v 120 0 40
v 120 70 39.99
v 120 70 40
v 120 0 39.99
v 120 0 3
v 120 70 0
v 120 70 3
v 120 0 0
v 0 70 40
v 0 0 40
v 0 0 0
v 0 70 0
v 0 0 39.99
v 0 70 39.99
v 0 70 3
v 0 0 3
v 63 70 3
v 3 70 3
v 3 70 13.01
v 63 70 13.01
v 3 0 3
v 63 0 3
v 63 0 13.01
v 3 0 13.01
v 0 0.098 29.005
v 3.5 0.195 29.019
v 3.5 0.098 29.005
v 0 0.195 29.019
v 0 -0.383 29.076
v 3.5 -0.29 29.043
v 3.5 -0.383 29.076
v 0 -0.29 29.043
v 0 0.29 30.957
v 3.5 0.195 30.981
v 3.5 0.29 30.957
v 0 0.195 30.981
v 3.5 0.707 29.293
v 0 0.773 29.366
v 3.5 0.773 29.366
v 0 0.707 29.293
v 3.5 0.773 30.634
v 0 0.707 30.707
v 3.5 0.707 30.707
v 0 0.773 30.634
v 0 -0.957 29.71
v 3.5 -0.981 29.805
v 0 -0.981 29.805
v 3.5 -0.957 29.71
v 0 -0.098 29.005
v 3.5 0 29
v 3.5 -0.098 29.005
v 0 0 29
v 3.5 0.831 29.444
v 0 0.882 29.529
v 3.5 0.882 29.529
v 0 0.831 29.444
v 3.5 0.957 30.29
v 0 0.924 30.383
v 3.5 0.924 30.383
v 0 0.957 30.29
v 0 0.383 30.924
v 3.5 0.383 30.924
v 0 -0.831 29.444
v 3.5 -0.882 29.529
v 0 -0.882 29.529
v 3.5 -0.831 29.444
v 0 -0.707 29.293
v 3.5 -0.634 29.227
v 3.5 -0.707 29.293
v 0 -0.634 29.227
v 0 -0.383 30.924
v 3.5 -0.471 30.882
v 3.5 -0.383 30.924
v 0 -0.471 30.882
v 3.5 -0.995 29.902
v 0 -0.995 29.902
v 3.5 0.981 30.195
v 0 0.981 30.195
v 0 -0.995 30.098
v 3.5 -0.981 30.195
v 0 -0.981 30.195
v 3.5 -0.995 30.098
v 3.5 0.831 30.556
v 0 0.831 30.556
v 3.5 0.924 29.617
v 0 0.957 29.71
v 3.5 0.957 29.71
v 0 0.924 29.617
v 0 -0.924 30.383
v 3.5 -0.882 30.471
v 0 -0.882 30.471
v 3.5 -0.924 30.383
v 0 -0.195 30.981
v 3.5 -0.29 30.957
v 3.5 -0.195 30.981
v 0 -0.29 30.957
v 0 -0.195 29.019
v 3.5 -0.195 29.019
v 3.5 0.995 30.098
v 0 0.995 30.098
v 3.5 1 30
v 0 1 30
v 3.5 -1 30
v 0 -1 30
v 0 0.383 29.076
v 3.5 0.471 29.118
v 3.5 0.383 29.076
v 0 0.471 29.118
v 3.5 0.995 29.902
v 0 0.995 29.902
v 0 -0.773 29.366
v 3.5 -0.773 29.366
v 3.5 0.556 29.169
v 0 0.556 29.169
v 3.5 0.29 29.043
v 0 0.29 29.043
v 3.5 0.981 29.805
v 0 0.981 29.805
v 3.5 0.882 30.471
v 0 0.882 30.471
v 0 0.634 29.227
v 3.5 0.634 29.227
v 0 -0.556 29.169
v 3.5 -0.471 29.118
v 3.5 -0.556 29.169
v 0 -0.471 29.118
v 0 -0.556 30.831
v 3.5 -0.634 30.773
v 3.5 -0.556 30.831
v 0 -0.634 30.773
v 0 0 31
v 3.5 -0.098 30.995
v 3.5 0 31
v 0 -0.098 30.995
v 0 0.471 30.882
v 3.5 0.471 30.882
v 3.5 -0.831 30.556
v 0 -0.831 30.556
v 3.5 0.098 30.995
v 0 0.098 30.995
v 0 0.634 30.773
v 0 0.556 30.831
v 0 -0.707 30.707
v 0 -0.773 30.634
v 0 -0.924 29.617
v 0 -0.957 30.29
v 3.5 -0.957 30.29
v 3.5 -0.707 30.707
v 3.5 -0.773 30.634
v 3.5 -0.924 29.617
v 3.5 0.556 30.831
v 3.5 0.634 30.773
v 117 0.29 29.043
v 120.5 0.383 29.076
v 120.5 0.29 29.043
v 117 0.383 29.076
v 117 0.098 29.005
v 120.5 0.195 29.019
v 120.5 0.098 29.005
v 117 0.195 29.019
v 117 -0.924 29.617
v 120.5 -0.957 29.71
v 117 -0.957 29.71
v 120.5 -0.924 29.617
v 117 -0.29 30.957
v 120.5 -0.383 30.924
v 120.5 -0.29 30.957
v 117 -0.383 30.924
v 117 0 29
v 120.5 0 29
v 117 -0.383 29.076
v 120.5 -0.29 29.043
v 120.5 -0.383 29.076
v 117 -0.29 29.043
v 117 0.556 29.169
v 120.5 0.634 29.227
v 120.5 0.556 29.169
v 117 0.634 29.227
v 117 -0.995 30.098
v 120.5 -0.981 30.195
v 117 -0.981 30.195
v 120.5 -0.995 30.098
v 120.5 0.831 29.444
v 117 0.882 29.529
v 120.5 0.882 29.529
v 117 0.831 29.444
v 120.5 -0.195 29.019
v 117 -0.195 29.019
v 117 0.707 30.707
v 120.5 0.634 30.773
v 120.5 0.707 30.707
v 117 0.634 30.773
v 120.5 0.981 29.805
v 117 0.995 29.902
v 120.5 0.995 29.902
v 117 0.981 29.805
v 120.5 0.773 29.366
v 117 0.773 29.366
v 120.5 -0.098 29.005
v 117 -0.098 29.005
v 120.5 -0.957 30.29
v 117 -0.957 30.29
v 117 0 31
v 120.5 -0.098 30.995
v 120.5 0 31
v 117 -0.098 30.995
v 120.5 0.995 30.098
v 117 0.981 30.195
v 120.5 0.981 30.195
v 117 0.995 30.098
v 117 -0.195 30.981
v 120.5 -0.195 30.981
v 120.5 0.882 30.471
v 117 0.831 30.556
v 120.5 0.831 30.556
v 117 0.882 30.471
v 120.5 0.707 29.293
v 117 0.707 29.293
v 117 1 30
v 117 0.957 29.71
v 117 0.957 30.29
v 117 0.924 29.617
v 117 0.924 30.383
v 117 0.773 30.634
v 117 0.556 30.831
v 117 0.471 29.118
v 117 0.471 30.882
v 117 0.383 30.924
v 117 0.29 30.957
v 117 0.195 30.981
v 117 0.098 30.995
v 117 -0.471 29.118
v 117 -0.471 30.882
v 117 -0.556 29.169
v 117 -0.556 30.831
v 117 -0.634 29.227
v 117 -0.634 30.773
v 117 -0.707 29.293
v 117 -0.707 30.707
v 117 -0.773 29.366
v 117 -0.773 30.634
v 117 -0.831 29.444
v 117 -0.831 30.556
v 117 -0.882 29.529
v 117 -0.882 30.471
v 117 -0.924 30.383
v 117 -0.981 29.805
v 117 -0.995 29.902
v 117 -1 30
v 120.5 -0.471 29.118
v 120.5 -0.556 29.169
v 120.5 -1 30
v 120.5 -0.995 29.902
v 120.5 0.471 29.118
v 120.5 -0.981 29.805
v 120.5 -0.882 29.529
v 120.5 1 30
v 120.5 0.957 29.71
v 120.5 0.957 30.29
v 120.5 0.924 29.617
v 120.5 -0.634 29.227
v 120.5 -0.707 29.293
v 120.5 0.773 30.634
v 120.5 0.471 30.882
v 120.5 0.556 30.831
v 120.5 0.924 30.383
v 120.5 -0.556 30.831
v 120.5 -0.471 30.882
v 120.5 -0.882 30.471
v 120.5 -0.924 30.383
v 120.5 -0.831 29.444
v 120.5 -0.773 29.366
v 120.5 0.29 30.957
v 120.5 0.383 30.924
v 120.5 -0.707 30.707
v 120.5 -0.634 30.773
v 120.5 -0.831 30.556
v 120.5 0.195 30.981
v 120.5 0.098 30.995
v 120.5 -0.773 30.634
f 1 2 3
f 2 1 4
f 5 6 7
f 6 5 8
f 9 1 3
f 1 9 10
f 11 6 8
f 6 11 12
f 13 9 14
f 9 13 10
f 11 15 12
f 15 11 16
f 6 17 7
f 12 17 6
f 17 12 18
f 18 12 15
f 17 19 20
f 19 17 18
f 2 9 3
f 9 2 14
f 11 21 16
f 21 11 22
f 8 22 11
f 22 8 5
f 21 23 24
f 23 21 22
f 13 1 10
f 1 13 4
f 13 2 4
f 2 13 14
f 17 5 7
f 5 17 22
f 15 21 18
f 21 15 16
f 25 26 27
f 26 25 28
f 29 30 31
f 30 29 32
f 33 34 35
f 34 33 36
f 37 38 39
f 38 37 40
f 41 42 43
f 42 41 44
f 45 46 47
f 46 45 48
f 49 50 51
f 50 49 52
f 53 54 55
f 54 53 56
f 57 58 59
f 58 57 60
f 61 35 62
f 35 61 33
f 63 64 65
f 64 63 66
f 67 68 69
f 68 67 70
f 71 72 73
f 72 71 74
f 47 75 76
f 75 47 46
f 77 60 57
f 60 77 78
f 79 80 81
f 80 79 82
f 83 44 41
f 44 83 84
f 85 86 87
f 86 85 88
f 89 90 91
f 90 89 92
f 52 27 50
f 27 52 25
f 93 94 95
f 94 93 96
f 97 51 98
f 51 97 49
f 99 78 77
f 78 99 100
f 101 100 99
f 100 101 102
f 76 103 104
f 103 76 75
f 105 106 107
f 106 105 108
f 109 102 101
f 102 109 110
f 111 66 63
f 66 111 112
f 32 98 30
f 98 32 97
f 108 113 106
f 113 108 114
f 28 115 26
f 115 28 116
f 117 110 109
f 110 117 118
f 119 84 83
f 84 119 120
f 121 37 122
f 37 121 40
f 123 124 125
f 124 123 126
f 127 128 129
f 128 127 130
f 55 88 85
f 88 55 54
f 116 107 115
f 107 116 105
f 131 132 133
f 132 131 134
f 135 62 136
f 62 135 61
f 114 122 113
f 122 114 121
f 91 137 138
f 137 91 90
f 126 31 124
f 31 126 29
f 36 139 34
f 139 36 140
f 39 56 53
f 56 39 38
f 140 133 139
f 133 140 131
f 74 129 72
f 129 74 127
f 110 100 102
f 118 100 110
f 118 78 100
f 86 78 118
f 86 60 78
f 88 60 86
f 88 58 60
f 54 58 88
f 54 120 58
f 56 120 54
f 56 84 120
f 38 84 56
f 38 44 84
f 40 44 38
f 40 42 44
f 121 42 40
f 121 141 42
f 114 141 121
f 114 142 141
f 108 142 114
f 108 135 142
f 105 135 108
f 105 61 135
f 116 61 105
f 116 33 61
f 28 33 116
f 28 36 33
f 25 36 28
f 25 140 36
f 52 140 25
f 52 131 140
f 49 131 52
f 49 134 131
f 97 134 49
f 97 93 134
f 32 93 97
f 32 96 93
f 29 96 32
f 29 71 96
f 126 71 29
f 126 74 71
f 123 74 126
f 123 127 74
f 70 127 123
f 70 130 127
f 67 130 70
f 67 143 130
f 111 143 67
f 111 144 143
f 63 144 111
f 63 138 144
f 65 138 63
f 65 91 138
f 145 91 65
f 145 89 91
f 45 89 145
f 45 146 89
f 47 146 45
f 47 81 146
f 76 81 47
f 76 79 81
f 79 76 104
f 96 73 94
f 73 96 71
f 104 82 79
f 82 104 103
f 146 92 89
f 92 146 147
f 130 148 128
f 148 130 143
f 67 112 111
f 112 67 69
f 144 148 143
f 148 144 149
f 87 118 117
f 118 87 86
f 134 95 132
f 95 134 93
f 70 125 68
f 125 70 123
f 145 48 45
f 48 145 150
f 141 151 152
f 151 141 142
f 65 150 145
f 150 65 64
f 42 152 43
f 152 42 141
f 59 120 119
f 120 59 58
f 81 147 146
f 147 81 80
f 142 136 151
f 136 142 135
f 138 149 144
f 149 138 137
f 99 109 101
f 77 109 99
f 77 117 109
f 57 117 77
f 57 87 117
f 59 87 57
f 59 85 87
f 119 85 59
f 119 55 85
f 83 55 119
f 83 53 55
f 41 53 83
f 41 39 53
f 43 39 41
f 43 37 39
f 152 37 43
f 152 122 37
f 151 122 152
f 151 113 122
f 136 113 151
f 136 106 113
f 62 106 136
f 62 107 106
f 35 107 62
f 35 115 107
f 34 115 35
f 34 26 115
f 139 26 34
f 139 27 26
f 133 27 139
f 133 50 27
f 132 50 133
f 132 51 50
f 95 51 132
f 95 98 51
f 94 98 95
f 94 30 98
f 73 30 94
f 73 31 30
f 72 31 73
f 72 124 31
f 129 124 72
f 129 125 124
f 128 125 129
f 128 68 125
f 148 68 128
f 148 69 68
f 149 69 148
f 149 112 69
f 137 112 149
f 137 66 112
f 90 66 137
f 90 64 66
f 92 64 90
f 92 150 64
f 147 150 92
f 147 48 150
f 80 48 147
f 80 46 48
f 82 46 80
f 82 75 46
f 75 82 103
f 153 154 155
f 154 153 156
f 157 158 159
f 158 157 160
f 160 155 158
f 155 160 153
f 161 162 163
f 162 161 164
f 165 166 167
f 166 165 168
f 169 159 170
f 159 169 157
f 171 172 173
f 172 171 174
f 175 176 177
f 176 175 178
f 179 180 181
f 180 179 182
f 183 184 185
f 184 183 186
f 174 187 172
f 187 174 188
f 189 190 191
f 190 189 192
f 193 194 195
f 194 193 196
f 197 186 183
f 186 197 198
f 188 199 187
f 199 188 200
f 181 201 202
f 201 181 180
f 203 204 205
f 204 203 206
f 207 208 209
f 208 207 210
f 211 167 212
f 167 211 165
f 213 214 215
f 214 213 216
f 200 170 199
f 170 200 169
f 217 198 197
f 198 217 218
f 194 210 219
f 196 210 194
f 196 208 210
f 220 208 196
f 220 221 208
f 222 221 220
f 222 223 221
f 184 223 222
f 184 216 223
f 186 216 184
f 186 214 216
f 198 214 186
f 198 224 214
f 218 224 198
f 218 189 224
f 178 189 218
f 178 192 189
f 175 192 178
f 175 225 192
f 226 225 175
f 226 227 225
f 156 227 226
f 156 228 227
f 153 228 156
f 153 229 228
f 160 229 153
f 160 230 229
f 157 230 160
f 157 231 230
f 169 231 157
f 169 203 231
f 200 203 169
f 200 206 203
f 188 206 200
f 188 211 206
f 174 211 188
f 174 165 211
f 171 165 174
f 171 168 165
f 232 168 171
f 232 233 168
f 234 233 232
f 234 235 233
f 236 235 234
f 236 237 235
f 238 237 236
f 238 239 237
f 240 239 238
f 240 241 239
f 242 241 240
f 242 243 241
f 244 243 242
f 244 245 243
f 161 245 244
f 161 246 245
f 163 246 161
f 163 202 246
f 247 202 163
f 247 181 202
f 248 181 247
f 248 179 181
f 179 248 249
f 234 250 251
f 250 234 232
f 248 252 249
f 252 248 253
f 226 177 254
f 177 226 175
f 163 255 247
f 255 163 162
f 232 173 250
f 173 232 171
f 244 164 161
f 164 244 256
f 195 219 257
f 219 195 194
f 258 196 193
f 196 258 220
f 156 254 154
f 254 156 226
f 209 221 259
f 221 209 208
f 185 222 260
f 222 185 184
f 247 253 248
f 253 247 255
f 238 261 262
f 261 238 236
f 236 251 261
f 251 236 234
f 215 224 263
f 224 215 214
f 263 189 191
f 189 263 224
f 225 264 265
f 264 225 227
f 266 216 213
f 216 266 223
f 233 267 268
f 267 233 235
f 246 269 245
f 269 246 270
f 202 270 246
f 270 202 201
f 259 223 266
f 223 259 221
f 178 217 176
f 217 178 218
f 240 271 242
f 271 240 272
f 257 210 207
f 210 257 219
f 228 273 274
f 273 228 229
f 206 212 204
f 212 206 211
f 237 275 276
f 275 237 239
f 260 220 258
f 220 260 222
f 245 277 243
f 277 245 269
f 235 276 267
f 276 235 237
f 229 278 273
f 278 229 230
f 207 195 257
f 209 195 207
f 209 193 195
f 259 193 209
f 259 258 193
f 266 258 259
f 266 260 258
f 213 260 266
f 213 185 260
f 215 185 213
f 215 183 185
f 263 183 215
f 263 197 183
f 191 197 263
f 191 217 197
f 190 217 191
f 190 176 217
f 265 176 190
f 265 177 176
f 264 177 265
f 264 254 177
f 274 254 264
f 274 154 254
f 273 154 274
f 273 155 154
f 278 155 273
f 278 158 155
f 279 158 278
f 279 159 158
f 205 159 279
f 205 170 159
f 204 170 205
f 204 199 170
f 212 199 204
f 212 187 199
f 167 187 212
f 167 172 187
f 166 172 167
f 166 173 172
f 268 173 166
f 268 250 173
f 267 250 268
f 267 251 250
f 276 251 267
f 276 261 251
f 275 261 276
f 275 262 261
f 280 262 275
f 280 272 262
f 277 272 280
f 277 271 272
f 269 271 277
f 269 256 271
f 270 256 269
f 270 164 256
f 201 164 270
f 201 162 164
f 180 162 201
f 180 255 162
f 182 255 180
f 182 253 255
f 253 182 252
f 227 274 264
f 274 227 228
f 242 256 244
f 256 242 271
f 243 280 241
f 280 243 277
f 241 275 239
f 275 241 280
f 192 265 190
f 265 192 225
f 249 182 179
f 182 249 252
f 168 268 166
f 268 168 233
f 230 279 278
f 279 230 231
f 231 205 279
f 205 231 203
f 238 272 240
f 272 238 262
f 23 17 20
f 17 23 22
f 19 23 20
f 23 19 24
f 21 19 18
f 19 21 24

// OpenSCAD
// Mini horizontal gel-electrophoresis box - buffer tank
// Print orientation: tank rests on XY plane (z = 0), builds upward (+Z)

// ---------------- Parameters ----------------
outer_x      = 120;   // outer length in X (mm)
outer_y      = 70;    // outer width in Y (mm)
outer_z      = 40;    // outer height in Z (mm)

wall         = 3;     // wall thickness (mm)
floor        = 3;     // floor thickness (mm)

platform_x   = 60;    // platform length in X (mm)
platform_y   = outer_y; // platform spans full inner width (mm)
platform_top = 13;    // platform top height above outer bottom (mm)

hole_d       = 2;     // electrode hole diameter (mm)
hole_y       = 0;     // electrode hole Y position (mm)
hole_z       = 30;    // electrode hole Z position (mm)

eps          = 0.5;   // cutter overshoot past faces (mm)
$fn          = 96;    // curve resolution

// Derived
inner_x = outer_x - 2 * wall;   // 114 mm
inner_z = outer_z - floor;      // 37 mm (floor at z = 0..3)
plat_h  = platform_top - floor; // 10 mm (platform sits on inner floor)

// ---------------- Model ----------------
union() {
    // Tank body (open top)
    difference() {
        cube([outer_x, outer_y, outer_z]);
        translate([0, 0, floor])
            cube([outer_x, outer_y, outer_z - floor - 0.01]); // open top cut
    }

    // Central raised platform (gel tray support)
    translate([wall, 0, floor])
        cube([platform_x, platform_y, plat_h + 0.01]);

    // Electrode holes through end walls, along X
    for (sx = [-1, 1])
        translate([sx > 0 ? outer_x - wall : 0, hole_y, hole_z])
            rotate([0, 90, 0])
                cylinder(d = hole_d, h = wall + eps, $fn = 64);
}
